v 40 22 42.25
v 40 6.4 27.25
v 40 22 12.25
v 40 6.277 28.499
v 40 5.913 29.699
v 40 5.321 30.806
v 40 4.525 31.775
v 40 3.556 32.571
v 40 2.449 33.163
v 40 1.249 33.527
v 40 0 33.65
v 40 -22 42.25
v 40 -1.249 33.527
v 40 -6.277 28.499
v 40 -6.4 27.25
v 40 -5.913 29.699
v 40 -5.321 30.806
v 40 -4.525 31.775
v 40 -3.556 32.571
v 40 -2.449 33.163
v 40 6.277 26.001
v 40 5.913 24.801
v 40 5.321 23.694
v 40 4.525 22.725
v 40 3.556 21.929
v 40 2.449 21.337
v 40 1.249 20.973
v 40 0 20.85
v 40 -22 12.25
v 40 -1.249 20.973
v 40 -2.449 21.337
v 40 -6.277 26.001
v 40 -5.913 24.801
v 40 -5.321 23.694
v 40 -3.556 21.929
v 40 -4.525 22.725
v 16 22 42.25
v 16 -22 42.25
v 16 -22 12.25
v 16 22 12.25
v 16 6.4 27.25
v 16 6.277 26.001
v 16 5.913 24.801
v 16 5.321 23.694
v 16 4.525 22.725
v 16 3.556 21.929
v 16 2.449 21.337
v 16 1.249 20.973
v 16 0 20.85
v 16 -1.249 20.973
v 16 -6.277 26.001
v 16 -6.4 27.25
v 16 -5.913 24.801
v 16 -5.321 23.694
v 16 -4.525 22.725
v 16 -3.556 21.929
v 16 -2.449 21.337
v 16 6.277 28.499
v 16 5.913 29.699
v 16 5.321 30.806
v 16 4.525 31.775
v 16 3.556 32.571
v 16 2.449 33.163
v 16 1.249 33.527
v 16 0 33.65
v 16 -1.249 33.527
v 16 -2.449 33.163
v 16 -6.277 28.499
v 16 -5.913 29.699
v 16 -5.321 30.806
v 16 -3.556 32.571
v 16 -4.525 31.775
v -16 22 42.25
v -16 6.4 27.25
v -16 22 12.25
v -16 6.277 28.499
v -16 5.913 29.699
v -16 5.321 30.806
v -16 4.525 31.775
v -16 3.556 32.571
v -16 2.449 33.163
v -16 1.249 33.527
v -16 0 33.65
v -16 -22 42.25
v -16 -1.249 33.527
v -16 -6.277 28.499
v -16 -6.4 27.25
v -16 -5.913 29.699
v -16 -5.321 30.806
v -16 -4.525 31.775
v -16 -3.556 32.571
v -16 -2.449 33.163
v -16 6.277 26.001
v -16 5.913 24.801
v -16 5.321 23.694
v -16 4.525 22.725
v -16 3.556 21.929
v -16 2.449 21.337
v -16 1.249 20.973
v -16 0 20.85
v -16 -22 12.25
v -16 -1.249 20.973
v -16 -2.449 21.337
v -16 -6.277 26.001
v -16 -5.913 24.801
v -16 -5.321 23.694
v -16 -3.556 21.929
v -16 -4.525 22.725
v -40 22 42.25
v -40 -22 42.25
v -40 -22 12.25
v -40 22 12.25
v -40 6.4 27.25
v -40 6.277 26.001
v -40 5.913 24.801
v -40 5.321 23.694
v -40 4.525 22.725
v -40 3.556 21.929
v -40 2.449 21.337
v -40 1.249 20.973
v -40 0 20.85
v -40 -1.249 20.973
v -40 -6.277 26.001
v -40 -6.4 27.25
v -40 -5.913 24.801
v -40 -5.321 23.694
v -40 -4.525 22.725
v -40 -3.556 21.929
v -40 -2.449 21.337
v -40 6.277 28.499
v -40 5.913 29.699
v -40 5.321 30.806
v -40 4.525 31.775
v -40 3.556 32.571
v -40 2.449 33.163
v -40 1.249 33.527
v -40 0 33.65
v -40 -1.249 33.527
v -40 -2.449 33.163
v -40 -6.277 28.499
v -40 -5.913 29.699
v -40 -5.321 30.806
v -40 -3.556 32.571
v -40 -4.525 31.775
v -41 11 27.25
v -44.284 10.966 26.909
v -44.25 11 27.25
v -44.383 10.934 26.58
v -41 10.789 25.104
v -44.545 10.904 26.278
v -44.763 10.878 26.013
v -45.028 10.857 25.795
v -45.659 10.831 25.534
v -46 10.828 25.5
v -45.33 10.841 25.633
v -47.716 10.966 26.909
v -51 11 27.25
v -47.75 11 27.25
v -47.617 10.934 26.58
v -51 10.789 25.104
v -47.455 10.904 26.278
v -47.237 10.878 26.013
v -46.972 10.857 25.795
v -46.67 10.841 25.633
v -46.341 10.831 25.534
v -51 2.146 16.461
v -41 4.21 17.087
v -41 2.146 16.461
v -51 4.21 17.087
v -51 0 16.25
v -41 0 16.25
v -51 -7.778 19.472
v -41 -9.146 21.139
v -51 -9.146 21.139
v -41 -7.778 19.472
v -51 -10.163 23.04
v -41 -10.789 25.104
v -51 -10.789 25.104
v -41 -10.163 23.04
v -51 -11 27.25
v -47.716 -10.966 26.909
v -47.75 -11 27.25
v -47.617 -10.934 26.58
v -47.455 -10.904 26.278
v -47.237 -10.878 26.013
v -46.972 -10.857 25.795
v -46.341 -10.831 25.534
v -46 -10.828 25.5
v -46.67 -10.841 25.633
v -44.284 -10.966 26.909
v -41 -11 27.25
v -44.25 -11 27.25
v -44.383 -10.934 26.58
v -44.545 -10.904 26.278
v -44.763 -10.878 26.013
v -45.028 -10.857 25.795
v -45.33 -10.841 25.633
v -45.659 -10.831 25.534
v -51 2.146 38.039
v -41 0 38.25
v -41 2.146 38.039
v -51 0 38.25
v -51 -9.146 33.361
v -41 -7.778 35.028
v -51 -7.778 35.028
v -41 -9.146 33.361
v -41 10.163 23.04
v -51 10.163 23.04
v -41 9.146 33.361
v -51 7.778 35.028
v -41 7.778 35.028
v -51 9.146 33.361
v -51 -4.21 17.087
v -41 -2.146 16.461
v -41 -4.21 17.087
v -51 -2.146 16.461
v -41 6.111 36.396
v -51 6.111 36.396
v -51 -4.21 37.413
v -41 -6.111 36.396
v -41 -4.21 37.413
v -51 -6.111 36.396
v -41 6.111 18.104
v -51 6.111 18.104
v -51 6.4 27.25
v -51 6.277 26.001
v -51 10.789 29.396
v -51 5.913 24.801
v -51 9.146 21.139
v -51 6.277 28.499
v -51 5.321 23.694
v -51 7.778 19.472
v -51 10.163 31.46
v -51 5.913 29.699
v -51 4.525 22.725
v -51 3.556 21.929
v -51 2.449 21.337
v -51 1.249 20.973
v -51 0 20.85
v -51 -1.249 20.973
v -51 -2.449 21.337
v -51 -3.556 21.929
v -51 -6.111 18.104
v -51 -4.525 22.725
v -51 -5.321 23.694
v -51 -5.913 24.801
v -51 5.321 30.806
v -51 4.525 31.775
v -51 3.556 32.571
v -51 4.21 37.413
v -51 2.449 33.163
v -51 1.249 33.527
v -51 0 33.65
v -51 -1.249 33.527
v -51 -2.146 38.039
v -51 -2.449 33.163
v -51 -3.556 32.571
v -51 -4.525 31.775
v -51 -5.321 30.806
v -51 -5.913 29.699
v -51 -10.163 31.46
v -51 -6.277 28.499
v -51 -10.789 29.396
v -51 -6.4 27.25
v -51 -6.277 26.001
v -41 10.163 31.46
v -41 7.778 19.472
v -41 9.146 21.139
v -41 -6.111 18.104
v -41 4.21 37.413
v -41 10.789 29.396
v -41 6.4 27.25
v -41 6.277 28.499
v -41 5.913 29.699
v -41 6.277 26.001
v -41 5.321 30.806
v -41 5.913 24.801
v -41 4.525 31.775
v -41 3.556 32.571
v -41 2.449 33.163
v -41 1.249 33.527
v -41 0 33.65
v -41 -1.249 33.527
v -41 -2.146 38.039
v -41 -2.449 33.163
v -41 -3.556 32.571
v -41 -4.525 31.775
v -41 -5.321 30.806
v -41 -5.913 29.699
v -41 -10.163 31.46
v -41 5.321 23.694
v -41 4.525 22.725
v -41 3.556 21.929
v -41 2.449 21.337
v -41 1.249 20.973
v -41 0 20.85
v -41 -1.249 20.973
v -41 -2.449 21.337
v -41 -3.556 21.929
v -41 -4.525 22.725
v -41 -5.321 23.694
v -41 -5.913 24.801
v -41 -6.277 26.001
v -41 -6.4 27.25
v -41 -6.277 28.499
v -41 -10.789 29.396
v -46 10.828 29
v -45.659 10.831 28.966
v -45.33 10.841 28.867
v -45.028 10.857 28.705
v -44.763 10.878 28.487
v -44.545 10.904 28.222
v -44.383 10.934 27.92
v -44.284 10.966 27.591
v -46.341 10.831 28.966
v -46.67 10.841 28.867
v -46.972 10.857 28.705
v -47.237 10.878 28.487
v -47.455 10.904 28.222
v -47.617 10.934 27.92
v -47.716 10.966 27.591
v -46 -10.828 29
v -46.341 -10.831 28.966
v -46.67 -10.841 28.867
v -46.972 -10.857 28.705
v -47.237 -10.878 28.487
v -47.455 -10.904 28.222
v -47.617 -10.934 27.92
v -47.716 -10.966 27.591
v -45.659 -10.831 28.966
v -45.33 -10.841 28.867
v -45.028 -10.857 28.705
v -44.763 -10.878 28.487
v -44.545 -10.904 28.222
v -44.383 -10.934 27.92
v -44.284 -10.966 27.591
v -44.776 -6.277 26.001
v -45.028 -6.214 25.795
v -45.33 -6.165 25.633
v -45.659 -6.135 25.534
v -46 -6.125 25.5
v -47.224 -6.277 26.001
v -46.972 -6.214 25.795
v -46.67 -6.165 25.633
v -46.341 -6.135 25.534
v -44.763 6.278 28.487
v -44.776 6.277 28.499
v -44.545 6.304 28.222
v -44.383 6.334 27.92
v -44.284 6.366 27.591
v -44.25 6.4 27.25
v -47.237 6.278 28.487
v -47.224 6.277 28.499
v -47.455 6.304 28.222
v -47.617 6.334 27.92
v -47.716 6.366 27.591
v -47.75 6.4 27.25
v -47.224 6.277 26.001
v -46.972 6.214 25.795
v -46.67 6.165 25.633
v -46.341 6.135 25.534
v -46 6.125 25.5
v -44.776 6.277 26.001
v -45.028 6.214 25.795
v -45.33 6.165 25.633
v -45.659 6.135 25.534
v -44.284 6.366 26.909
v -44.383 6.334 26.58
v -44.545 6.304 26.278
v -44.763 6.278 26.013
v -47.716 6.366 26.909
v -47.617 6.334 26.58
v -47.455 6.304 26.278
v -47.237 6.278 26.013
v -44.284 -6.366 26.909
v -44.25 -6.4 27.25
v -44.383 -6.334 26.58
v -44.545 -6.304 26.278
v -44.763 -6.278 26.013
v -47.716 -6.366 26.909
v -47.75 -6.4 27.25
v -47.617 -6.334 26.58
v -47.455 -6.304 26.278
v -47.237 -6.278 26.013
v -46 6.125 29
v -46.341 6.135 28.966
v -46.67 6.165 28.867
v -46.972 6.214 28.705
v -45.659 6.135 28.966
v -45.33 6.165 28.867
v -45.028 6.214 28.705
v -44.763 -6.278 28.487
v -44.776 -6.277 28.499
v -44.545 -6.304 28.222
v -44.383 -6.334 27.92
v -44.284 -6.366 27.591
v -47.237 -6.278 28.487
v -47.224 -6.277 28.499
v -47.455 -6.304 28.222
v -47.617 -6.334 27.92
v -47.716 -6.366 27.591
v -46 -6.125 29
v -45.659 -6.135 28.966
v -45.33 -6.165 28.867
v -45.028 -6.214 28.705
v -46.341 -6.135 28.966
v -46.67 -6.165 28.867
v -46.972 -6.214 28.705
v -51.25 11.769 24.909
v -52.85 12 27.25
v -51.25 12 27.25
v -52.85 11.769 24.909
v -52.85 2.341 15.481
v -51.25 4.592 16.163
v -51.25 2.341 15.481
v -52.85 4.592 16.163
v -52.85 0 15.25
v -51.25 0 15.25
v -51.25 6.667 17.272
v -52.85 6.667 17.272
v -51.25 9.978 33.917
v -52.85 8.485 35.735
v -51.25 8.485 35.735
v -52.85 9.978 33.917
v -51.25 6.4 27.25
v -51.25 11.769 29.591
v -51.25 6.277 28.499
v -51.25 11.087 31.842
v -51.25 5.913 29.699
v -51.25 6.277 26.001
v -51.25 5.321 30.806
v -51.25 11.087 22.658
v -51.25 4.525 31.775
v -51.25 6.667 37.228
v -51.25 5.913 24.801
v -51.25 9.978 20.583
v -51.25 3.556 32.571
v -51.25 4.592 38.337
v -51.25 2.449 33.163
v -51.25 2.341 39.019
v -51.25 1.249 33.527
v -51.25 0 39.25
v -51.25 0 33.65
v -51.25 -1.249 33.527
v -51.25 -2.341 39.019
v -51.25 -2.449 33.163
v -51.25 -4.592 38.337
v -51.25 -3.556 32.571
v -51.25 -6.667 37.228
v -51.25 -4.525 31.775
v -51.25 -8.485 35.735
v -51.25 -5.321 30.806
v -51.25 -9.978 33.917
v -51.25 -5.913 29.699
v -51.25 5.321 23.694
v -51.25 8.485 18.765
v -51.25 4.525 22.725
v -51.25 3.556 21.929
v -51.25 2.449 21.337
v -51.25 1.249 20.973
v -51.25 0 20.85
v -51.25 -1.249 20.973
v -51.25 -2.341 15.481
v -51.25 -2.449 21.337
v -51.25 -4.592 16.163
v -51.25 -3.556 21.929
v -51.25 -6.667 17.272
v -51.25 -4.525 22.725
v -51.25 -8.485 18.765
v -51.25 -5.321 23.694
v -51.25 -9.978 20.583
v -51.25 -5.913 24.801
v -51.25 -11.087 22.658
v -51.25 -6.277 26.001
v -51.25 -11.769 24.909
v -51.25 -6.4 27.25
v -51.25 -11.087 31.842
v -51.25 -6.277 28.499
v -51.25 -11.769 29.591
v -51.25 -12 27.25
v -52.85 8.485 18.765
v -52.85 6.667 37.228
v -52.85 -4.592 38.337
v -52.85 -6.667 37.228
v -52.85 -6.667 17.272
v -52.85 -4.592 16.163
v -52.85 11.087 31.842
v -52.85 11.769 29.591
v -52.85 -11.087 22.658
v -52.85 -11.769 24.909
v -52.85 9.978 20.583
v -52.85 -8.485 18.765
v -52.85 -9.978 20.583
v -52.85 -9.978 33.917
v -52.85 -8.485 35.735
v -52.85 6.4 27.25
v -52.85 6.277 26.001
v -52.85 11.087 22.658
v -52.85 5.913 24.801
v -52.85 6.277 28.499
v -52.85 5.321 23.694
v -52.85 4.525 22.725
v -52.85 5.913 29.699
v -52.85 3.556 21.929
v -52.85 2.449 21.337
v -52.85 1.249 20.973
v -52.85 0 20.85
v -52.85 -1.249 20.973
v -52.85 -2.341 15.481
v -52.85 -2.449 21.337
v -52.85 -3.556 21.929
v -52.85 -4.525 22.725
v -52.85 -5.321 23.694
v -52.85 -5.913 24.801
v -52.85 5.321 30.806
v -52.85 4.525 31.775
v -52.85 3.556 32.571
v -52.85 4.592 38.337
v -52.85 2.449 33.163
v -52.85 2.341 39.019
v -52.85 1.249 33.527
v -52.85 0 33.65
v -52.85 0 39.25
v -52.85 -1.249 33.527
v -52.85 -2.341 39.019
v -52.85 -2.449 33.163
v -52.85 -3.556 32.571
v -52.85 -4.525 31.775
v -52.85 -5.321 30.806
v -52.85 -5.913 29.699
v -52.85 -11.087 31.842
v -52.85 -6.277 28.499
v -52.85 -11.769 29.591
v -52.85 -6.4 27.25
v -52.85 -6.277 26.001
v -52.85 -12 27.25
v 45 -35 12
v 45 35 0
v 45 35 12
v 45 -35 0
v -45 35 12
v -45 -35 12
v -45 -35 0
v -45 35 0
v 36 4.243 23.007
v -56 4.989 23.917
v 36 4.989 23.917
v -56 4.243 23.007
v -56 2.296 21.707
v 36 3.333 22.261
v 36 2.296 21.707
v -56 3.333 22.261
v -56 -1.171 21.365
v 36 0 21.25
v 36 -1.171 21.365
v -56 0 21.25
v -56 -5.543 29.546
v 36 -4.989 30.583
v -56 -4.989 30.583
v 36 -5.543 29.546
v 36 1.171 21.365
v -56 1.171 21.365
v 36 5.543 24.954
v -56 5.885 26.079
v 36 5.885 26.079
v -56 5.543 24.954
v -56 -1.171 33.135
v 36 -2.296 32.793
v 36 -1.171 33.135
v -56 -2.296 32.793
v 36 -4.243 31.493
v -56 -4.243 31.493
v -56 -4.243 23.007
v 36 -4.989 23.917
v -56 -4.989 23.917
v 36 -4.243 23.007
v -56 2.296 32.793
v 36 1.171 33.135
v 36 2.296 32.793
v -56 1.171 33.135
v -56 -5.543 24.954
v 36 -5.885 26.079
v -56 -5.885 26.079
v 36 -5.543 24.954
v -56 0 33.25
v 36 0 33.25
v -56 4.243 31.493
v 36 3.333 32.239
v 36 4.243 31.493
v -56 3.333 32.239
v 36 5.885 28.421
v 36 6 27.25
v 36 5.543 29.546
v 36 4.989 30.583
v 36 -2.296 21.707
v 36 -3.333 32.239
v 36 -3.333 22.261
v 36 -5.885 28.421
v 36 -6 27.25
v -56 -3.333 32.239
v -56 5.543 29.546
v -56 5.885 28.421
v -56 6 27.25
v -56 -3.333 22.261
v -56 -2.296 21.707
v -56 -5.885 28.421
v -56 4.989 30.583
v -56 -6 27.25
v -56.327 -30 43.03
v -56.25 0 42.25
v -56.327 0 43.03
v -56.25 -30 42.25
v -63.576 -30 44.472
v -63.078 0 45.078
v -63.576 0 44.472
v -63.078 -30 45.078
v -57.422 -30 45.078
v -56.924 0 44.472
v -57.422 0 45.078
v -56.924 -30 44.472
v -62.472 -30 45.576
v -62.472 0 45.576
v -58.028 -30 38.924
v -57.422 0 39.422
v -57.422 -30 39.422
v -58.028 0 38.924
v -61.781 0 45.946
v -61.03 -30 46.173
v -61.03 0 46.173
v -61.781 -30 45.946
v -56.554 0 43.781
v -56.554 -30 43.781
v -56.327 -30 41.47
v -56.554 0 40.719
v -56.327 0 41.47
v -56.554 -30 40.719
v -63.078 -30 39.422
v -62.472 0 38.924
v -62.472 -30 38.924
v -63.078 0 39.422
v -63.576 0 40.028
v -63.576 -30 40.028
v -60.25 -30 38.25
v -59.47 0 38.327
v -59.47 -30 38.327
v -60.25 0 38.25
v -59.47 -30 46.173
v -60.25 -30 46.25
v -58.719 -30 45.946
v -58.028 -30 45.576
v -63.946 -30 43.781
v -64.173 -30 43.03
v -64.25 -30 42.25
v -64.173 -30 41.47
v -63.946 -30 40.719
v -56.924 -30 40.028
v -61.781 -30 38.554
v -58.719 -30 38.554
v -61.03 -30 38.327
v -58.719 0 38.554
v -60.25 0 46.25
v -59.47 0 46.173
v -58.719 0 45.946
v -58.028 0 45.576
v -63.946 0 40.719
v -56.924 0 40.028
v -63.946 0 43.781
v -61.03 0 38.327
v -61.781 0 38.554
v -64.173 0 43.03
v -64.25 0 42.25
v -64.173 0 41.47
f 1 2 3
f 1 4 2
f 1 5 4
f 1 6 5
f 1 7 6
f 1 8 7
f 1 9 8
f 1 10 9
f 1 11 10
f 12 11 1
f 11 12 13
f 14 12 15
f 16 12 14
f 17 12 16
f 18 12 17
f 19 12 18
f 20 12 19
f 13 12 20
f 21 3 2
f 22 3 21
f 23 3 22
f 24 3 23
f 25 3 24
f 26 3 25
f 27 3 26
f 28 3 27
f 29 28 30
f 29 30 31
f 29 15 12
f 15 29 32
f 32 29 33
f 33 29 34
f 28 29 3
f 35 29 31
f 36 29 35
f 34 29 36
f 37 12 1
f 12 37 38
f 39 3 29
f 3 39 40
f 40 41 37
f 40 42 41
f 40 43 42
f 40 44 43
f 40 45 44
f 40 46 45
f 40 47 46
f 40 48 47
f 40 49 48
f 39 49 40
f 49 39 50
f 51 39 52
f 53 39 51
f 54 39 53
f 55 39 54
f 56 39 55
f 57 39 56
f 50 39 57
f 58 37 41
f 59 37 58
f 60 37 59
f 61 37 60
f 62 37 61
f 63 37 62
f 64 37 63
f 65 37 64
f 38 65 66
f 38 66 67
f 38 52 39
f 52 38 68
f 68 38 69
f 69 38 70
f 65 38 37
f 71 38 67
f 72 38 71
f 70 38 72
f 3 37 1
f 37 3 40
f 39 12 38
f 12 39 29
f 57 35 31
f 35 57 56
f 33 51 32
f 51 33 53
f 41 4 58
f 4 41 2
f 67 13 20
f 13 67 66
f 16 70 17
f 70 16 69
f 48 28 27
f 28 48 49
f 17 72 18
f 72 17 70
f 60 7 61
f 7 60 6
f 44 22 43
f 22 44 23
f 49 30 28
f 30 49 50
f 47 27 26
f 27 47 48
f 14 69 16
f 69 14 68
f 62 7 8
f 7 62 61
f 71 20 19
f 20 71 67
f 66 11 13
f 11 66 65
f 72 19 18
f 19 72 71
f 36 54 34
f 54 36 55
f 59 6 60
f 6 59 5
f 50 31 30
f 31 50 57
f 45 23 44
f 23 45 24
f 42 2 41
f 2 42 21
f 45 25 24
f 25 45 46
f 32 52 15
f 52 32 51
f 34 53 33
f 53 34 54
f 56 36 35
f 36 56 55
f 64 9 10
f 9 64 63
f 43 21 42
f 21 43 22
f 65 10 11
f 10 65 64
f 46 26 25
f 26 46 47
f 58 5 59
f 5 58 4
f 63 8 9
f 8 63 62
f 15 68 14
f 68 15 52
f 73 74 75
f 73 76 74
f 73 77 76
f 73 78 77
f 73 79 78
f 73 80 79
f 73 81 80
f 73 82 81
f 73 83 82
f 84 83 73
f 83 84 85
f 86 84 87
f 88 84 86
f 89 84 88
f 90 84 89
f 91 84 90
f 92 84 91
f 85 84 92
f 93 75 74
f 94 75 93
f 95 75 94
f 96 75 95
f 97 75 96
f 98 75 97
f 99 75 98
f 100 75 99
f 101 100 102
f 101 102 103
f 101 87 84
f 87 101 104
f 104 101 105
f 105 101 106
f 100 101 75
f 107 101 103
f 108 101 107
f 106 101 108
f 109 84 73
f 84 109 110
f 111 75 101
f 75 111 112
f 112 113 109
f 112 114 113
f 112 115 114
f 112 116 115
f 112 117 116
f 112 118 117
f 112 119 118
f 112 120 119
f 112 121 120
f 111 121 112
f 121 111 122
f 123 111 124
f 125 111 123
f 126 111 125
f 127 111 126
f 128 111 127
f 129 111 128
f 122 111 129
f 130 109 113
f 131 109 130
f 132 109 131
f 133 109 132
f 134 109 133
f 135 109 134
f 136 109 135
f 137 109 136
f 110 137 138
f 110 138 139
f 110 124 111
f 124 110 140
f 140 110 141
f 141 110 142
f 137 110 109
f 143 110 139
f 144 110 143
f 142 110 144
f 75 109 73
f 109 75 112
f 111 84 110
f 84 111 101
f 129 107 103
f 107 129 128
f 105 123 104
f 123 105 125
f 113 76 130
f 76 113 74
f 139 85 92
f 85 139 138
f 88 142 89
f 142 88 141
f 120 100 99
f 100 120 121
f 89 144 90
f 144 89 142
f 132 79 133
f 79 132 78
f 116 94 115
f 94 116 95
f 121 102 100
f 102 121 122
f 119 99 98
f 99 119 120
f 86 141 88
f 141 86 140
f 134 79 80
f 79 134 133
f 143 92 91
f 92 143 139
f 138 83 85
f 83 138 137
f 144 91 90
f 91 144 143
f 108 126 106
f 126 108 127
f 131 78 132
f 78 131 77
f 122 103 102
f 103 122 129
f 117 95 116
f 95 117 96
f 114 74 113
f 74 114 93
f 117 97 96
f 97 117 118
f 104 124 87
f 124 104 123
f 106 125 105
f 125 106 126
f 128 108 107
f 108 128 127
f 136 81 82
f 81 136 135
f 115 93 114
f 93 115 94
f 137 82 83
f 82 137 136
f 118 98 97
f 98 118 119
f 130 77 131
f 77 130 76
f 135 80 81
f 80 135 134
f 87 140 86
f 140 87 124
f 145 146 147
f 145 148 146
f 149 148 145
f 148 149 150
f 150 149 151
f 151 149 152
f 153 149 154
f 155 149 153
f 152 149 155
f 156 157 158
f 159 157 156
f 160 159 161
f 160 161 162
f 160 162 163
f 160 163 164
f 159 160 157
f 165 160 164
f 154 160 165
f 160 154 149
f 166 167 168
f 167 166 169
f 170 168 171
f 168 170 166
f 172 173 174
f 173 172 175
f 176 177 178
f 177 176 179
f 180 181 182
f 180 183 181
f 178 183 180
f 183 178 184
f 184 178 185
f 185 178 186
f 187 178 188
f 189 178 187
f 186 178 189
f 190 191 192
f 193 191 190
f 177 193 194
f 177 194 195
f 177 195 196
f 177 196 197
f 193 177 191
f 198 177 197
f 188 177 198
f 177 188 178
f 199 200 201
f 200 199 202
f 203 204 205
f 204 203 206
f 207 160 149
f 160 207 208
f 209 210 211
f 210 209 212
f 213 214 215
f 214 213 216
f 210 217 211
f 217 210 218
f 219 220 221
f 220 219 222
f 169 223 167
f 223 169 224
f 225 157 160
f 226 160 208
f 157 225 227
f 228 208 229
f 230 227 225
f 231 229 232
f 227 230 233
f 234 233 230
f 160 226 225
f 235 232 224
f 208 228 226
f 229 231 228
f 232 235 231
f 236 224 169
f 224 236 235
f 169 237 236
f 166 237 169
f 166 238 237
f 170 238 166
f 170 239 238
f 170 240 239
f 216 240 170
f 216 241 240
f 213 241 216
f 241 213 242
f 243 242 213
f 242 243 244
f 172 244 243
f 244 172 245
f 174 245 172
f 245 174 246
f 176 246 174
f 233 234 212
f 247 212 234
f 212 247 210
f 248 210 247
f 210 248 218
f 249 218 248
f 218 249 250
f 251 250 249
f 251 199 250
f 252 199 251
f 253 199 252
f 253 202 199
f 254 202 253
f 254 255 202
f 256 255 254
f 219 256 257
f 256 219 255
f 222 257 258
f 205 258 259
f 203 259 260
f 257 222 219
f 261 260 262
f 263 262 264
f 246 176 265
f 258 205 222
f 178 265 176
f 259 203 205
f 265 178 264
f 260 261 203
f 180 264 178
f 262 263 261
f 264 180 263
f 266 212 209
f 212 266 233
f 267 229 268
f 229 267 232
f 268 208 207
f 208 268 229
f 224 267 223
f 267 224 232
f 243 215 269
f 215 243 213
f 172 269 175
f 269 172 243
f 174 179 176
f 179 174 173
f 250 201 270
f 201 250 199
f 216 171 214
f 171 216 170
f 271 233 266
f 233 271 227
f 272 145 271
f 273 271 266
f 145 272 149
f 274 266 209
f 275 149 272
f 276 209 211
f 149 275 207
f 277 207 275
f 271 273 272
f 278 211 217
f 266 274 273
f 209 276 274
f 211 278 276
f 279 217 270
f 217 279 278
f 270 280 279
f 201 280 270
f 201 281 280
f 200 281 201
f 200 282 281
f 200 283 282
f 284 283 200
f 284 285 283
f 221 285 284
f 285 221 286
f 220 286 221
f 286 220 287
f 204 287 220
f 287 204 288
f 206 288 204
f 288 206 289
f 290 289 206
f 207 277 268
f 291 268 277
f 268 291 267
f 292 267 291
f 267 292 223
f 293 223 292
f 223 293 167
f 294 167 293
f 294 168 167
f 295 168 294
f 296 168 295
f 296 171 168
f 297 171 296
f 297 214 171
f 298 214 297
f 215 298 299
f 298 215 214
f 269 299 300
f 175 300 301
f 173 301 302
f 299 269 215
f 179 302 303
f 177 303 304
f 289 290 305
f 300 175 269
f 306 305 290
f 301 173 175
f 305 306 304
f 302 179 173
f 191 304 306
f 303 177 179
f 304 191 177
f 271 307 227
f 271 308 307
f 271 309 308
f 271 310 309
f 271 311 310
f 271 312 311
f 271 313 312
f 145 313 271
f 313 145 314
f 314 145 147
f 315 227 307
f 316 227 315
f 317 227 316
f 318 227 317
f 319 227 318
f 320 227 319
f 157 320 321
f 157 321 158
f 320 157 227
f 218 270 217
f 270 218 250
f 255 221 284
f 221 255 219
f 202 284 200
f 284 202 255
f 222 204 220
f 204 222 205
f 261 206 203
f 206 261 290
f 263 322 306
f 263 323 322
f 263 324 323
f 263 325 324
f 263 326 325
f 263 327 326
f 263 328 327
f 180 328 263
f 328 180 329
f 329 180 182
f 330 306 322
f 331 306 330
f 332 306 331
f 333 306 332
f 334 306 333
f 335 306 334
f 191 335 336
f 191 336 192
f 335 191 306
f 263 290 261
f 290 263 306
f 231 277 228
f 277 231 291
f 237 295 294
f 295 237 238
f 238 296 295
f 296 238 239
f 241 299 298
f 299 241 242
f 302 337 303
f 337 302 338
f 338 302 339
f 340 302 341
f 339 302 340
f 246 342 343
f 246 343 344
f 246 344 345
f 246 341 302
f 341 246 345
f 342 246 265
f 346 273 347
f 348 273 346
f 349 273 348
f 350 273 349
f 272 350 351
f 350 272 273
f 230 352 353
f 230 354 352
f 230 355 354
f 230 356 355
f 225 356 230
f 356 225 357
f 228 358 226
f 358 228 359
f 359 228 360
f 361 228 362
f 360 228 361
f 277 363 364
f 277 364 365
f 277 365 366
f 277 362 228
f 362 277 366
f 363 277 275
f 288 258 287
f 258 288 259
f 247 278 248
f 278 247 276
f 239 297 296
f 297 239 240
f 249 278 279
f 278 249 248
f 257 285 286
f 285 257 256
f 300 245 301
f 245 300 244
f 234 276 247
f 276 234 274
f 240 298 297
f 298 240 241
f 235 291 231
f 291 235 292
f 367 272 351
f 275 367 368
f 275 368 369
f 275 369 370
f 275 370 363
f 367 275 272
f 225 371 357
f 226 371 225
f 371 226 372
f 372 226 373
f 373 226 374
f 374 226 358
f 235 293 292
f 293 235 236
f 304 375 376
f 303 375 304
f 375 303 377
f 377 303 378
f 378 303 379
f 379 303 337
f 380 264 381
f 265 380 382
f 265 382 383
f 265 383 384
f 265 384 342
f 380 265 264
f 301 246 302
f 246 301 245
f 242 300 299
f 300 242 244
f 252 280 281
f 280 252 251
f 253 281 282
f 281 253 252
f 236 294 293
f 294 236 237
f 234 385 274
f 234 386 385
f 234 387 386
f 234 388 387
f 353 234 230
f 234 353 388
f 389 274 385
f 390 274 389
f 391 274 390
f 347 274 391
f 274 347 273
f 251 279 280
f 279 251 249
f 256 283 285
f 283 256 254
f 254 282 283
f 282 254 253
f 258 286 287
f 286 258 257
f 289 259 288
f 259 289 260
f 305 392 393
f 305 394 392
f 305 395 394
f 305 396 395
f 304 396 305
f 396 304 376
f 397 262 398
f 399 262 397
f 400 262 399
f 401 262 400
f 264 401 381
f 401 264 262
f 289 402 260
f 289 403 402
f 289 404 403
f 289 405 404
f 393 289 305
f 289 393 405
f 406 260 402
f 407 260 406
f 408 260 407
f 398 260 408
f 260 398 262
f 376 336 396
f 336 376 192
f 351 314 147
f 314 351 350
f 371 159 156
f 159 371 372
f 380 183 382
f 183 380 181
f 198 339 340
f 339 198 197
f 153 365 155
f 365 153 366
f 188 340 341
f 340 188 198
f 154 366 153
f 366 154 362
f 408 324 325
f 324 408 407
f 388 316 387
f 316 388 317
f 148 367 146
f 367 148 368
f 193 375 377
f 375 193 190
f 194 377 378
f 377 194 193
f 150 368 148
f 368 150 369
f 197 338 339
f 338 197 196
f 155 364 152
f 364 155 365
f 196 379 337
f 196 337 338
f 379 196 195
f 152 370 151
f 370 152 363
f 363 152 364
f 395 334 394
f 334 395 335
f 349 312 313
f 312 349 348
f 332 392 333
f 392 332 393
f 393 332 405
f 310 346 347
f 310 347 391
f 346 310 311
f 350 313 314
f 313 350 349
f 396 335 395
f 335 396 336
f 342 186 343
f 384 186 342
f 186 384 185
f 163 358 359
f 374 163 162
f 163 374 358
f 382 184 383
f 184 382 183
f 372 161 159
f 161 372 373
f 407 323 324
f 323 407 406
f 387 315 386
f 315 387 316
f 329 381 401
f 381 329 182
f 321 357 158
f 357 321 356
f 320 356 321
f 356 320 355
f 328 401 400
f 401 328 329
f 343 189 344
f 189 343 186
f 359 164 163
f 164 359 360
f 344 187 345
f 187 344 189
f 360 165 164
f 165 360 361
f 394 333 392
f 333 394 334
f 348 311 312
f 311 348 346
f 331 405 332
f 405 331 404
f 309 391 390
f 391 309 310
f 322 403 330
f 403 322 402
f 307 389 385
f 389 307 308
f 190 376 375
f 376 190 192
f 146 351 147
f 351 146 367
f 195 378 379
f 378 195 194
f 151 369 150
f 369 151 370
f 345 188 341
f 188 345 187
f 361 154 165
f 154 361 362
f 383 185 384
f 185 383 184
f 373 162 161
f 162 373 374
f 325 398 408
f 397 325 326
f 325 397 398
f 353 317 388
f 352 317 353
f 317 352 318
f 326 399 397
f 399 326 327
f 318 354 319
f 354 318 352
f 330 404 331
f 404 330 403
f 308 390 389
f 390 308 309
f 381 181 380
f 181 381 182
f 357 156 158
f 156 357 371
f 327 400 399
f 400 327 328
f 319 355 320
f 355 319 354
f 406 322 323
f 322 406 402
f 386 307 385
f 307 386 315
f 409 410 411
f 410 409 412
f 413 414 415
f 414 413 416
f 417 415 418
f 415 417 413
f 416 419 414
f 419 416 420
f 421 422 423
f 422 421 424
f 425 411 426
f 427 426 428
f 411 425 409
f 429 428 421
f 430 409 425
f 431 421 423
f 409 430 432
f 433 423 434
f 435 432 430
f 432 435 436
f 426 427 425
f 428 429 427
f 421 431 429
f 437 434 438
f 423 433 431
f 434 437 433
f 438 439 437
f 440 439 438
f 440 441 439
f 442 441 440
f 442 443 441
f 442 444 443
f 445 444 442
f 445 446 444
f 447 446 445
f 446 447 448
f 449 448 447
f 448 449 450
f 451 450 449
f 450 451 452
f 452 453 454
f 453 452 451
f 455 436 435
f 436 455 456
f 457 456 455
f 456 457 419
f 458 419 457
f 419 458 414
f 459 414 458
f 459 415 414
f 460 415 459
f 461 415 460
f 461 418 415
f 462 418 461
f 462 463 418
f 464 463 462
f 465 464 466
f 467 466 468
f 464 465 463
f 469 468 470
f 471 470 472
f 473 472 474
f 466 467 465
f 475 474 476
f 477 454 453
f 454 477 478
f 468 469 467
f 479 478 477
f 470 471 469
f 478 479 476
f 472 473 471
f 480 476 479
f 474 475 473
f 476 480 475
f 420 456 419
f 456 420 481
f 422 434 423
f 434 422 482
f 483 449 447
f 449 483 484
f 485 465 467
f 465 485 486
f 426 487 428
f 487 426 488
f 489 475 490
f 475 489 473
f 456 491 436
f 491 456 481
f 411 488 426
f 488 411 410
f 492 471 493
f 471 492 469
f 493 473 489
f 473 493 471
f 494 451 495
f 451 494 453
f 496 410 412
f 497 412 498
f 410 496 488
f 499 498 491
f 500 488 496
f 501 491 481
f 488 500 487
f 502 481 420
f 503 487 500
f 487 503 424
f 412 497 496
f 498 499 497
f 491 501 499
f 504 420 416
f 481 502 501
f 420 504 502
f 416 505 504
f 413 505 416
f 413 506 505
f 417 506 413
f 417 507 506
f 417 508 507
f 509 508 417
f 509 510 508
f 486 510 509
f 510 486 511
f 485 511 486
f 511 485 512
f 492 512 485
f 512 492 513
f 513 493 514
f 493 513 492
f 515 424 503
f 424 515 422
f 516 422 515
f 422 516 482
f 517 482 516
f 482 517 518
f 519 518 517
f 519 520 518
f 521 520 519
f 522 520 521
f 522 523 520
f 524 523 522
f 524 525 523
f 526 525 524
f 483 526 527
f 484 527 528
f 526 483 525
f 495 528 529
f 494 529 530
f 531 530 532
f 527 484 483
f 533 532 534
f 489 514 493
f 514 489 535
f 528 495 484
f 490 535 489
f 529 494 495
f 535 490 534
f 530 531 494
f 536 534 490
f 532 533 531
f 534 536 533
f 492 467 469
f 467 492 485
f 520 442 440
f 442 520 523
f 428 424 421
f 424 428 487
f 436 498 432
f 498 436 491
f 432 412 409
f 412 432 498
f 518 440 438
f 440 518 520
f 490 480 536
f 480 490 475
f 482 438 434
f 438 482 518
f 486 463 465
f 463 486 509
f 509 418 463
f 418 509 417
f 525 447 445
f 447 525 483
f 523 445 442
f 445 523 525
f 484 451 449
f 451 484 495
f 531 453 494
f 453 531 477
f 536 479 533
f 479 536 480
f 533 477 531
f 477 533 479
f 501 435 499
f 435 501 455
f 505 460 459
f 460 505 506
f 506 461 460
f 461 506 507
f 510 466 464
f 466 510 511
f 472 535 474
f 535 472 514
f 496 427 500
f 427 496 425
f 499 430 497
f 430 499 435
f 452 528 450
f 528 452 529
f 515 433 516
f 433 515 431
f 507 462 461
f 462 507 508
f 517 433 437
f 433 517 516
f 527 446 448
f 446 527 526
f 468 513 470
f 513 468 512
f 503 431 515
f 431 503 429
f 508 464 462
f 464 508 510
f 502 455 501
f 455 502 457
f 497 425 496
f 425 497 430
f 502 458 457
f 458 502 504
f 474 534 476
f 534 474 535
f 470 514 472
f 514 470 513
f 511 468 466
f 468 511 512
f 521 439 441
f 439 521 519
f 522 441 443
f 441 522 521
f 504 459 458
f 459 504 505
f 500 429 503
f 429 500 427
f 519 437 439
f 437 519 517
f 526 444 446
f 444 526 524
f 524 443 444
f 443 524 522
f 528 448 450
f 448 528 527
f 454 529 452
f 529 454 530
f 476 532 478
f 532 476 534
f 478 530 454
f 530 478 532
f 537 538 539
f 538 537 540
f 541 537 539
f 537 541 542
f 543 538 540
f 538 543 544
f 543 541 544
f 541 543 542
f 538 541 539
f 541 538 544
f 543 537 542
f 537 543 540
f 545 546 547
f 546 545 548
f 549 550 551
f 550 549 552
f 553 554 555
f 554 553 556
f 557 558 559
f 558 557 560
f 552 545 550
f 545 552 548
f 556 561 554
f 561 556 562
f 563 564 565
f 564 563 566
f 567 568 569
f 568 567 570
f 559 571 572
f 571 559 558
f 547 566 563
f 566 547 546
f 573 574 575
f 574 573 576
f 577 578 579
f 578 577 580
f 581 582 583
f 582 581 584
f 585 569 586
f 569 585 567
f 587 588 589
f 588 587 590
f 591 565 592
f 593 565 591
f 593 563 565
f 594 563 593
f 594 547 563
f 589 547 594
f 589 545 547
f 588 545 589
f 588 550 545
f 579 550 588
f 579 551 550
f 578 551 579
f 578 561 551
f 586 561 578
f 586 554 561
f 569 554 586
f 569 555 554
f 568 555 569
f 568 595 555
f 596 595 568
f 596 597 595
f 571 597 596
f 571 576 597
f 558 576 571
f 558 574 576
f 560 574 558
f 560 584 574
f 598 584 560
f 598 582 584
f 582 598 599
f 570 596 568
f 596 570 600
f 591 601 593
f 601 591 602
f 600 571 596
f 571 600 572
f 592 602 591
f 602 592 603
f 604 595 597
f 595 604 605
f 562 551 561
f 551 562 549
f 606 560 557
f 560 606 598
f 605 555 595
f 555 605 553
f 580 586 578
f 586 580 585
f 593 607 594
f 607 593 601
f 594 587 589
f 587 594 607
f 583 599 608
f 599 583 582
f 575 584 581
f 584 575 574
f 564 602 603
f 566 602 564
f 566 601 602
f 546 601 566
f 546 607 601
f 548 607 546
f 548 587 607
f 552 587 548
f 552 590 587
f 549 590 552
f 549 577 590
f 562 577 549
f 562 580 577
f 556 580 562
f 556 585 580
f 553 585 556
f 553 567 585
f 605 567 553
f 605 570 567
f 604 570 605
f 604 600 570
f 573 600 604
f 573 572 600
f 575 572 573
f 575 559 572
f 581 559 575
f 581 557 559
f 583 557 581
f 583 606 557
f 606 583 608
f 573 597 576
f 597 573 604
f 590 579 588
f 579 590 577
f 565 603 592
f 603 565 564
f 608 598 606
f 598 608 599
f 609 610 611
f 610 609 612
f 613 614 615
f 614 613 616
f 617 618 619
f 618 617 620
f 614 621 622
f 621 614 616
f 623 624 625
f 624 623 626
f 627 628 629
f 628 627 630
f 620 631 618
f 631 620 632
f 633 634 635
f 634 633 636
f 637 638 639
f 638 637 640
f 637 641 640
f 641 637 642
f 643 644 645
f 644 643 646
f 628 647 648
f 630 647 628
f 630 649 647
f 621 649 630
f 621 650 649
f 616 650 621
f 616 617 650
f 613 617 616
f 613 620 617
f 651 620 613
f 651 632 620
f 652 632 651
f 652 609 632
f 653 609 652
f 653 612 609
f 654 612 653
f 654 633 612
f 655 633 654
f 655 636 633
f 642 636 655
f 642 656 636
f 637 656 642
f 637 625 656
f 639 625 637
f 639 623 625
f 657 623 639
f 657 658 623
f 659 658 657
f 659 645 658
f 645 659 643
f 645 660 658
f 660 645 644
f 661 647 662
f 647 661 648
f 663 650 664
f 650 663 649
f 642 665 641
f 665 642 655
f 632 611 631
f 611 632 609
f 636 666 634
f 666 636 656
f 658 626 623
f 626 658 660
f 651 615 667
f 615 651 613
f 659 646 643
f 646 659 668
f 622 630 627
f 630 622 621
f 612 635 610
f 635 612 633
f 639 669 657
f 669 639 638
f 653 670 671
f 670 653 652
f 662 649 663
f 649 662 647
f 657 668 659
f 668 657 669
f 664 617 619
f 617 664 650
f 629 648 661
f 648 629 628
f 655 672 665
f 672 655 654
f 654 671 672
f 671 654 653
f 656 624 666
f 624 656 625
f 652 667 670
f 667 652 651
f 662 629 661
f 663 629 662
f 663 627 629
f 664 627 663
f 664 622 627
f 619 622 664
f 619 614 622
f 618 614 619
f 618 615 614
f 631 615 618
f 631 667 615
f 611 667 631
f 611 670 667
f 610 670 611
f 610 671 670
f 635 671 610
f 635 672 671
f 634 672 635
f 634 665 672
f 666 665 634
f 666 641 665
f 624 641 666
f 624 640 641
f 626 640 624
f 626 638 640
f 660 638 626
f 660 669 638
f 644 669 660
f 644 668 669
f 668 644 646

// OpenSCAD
$fn = 32;

// ------------------------------------------------------------------------
// Machine vise: screw d12, jaws 24 x 30 mm
// Every part is its own module, assembly() places every instance.
// ------------------------------------------------------------------------

// --- part 1 ---
module vise_bed() {
  difference() {
    translate([-45, -35, 0]) cube([90, 70, 12]);
  }
}

// --- part 2 ---
module vise_jaw() {
  difference() {
    translate([-12, -22, 0]) cube([24, 44, 30]);
    translate([0, 0, 15]) rotate([0, 90, 0]) cylinder(h = 26, d = 12.8, center = true);
  }
}

// --- part 3 ---
module vise_screw() {
  translate([0, 0, -46]) cylinder(h = 92, d = 12);
}

// --- part 4 ---
module screw_collar() {
  difference() {
    cylinder(h = 10, d = 22);
    translate([0, 0, -1]) cylinder(h = 12, d = 12.8);
    translate([0, 0, 5]) rotate([90, 0, 0]) cylinder(h = 24, d = 3.5, center = true);
  }
}

// --- part 5 ---
module screw_washer() {
  difference() {
      translate([0, 0, 0]) cylinder(h = 1.6, d = 24);
      translate([0, 0, -1]) cylinder(h = 3.6, d = 12.8);
    }
}

// --- part 6 ---
module vise_handle() {
  cylinder(h = 30, d = 8);
}

// --- assembly ---
module assembly() {
  color([0.80, 0.24, 0.20]) translate([0, 0, 0]) rotate([0, 0, 0]) vise_bed();
  color([0.20, 0.45, 0.75]) translate([28, 0, 12.25]) rotate([0, 0, 0]) vise_jaw();
  color([0.25, 0.62, 0.32]) translate([-28, 0, 12.25]) rotate([0, 0, 0]) vise_jaw();
  color([0.92, 0.70, 0.18]) translate([-10, 0, 27.25]) rotate([0, 90, 0]) vise_screw();
  color([0.58, 0.35, 0.70]) translate([-51, 0, 27.25]) rotate([0, 90, 0]) screw_collar();
  color([0.16, 0.66, 0.66]) translate([-52.85, 0, 27.25]) rotate([0, 90, 0]) screw_washer();
  color([0.85, 0.48, 0.18]) translate([-60.25, 0, 42.25]) rotate([90, 0, 0]) vise_handle();
}

assembly();
